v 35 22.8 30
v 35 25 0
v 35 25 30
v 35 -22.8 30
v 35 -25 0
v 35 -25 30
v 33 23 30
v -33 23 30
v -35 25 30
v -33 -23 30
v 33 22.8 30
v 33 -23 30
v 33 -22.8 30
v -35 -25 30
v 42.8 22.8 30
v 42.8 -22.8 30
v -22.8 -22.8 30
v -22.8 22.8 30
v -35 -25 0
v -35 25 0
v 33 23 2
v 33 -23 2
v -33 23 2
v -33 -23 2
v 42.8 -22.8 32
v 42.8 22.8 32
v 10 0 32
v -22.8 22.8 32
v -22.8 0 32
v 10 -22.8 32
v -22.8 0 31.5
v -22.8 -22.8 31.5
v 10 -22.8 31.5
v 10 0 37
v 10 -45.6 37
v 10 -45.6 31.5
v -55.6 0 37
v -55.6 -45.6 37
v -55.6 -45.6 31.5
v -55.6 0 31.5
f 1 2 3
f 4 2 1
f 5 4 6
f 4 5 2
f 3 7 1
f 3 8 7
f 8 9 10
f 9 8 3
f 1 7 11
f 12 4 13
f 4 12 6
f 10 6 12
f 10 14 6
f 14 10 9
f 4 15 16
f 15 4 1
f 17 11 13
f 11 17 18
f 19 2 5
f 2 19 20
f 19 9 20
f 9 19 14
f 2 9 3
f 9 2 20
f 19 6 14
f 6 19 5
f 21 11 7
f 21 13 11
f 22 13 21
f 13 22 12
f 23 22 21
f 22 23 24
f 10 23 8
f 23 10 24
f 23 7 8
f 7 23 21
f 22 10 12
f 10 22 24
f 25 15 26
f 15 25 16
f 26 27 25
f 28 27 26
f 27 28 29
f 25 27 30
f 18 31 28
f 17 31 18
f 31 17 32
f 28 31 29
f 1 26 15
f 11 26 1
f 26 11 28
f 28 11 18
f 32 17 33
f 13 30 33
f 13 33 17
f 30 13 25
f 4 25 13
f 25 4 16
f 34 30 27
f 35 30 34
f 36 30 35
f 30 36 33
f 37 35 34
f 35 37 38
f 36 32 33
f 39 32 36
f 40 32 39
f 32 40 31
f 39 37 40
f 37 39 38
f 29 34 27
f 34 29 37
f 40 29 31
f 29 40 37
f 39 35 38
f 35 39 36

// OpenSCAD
// Two-part enclosure for small electronics board
// Print orientation: box standing on bed, lid upside down (plate on bed)

$fn = 64;

// ---- Box ----
box_x = 70;      // outer length (X)
box_y = 50;      // outer width (Y)
box_z = 30;      // outer height (Z)
wall = 2;        // side wall thickness
floor = 2;       // floor thickness

// ---- Lid ----
lip_w = 65.6;    // lip outer length (X)
lip_d = 45.6;    // lip outer width (Y)
lip_h = 4;       // lip height (wall thickness)
lip_t = 1.5;     // lip top thickness

// ---- Misc ----
eps = 0.5;       // cutter overshoot
gap = 10;        // gap between parts on bed

// Derived
inner_x = box_x - 2*wall;
inner_y = box_y - 2*wall;
lip_total_h = lip_h + lip_t;   // from plate top to lip top

module box() {
    difference() {
        translate([-box_x/2, -box_y/2, 0])
            cube([box_x, box_y, box_z]);
        // open-top cavity
        translate([-inner_x/2, -inner_y/2, floor])
            cube([inner_x, inner_y, box_z - floor + eps]);
    }
}

module lid() {
    translate([gap - lip_w/2, -lip_d/2, 0]) {
        // plate
        cube([lip_w, lip_d, 2]);
        // lip (overlaps plate slightly -> one solid)
        translate([-lip_w/2, -lip_d/2, 2 - eps])
            cube([lip_w, lip_d, lip_total_h]);
    }
}

union() {
    box();
    translate([0, 0, box_z])
        lid();
}
